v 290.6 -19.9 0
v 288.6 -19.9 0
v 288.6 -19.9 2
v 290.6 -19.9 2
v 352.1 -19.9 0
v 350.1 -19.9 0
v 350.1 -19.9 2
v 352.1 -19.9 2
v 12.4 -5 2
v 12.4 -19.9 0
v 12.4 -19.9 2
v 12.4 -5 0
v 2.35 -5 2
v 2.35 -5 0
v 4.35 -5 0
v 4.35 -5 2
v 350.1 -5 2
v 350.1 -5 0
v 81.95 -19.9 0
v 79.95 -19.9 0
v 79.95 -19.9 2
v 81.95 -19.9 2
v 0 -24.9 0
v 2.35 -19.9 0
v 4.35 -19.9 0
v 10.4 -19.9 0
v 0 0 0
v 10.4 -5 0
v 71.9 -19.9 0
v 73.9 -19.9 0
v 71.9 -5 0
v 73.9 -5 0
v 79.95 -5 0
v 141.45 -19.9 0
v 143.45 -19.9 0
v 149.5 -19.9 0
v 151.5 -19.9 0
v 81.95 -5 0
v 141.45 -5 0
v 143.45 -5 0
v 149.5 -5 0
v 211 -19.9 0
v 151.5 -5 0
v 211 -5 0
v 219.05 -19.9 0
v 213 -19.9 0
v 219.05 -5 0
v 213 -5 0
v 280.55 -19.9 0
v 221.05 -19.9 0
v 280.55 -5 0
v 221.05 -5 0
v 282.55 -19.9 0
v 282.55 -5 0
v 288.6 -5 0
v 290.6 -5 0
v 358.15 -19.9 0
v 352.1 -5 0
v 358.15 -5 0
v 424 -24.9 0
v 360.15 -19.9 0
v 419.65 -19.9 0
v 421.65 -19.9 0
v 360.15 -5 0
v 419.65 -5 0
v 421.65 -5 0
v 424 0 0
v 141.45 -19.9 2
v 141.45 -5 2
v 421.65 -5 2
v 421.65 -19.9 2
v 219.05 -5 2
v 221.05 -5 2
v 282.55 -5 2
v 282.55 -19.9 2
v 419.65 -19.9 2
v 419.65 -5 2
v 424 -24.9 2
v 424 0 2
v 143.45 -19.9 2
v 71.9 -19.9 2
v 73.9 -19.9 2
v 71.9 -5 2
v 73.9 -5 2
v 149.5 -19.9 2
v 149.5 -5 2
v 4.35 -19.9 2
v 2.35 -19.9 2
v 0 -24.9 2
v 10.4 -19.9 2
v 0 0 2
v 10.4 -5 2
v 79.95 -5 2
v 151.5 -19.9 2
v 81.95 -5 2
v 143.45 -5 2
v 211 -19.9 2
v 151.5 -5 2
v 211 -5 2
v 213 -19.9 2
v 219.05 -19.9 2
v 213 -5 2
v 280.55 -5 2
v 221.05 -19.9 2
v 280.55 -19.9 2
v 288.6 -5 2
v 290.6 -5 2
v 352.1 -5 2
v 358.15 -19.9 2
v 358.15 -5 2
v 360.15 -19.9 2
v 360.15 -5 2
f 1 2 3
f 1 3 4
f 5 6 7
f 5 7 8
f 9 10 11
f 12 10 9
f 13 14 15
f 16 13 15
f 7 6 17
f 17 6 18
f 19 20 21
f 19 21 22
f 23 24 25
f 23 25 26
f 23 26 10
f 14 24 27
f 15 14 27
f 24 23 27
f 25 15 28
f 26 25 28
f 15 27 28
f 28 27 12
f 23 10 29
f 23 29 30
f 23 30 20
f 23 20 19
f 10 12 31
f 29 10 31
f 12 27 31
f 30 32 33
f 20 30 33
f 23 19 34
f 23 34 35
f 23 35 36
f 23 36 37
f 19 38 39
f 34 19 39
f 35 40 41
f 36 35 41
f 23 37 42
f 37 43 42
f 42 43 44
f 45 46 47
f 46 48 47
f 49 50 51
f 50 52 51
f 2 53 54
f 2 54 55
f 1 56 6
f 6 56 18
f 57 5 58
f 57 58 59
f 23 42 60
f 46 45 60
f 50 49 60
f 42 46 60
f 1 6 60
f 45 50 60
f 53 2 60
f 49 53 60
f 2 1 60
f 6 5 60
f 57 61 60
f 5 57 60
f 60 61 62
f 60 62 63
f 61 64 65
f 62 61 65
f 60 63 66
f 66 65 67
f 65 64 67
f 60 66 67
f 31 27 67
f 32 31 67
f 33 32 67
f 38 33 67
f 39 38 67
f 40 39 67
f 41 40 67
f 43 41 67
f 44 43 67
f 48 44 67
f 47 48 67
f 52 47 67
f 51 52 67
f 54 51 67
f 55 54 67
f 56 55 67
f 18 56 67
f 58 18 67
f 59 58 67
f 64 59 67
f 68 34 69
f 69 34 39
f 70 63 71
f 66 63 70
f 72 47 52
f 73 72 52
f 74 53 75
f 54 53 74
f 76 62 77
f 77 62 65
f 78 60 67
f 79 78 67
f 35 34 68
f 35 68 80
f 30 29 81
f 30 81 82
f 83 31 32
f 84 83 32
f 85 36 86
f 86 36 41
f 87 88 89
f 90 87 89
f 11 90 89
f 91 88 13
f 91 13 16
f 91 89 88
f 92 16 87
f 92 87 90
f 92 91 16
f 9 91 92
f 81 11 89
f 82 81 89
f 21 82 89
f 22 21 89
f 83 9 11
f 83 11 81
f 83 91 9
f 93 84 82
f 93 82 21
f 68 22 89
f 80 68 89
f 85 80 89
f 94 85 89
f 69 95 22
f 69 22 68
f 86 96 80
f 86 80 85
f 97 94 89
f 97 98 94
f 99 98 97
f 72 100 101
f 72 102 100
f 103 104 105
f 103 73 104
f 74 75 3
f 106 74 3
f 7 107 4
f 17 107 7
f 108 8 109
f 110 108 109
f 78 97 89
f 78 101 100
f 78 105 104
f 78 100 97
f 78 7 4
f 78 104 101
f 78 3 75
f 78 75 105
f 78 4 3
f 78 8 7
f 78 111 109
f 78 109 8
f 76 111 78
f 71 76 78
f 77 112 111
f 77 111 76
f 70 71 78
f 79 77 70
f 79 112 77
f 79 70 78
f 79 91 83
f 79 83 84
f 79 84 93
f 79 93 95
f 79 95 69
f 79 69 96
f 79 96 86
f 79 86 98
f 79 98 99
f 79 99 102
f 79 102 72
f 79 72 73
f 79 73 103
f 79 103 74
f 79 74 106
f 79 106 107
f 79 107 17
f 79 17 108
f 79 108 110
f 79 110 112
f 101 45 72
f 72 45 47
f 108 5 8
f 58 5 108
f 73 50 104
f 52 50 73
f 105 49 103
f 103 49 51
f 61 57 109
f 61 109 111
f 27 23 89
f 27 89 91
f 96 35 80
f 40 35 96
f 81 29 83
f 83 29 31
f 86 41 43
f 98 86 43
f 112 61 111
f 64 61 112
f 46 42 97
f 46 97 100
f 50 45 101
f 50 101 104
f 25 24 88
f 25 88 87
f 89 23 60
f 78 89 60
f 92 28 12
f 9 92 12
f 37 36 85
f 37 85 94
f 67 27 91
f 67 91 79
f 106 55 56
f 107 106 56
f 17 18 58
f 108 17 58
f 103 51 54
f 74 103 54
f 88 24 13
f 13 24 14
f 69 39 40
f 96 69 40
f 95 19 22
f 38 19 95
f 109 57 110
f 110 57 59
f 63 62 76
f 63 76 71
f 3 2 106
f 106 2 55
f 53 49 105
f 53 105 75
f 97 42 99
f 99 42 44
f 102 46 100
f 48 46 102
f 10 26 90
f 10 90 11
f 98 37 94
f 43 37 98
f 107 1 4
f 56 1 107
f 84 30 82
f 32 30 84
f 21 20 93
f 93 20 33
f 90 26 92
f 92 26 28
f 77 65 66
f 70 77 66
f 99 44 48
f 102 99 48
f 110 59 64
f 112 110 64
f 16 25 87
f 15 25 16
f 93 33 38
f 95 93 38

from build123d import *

# Parameters (mm, degrees)
SKETCH2_W           = 424
SKETCH2_H           = 24.9
SKETCH2_W_2         = 2
SKETCH2_H_2         = 14.9
BOSS_EXTRUDE1_DEPTH = 2


with BuildPart() as part:
    # Sketch2 → Boss-Extrude1 (new body)
    with BuildSketch(Plane.XY):
        with Locations((212, -12.45)):
            Rectangle(SKETCH2_W, SKETCH2_H)
        with Locations((3.35, -12.45)):
            Rectangle(SKETCH2_W_2, SKETCH2_H_2, mode=Mode.SUBTRACT)
        with Locations((11.4, -12.45)):
            Rectangle(SKETCH2_W_2, SKETCH2_H_2, mode=Mode.SUBTRACT)
        with Locations((72.9, -12.45)):
            Rectangle(SKETCH2_W_2, SKETCH2_H_2, mode=Mode.SUBTRACT)
        with Locations((80.95, -12.45)):
            Rectangle(SKETCH2_W_2, SKETCH2_H_2, mode=Mode.SUBTRACT)
        with Locations((142.45, -12.45)):
            Rectangle(SKETCH2_W_2, SKETCH2_H_2, mode=Mode.SUBTRACT)
        with Locations((150.5, -12.45)):
            Rectangle(SKETCH2_W_2, SKETCH2_H_2, mode=Mode.SUBTRACT)
        with Locations((212, -12.45)):
            Rectangle(SKETCH2_W_2, SKETCH2_H_2, mode=Mode.SUBTRACT)
        with Locations((220.05, -12.45)):
            Rectangle(SKETCH2_W_2, SKETCH2_H_2, mode=Mode.SUBTRACT)
        with Locations((281.55, -12.45)):
            Rectangle(SKETCH2_W_2, SKETCH2_H_2, mode=Mode.SUBTRACT)
        with Locations((289.6, -12.45)):
            Rectangle(SKETCH2_W_2, SKETCH2_H_2, mode=Mode.SUBTRACT)
        with Locations((351.1, -12.45)):
            Rectangle(SKETCH2_W_2, SKETCH2_H_2, mode=Mode.SUBTRACT)
        with Locations((359.15, -12.45)):
            Rectangle(SKETCH2_W_2, SKETCH2_H_2, mode=Mode.SUBTRACT)
        with Locations((420.65, -12.45)):
            Rectangle(SKETCH2_W_2, SKETCH2_H_2, mode=Mode.SUBTRACT)
    extrude(amount=BOSS_EXTRUDE1_DEPTH)


solid = part.part
